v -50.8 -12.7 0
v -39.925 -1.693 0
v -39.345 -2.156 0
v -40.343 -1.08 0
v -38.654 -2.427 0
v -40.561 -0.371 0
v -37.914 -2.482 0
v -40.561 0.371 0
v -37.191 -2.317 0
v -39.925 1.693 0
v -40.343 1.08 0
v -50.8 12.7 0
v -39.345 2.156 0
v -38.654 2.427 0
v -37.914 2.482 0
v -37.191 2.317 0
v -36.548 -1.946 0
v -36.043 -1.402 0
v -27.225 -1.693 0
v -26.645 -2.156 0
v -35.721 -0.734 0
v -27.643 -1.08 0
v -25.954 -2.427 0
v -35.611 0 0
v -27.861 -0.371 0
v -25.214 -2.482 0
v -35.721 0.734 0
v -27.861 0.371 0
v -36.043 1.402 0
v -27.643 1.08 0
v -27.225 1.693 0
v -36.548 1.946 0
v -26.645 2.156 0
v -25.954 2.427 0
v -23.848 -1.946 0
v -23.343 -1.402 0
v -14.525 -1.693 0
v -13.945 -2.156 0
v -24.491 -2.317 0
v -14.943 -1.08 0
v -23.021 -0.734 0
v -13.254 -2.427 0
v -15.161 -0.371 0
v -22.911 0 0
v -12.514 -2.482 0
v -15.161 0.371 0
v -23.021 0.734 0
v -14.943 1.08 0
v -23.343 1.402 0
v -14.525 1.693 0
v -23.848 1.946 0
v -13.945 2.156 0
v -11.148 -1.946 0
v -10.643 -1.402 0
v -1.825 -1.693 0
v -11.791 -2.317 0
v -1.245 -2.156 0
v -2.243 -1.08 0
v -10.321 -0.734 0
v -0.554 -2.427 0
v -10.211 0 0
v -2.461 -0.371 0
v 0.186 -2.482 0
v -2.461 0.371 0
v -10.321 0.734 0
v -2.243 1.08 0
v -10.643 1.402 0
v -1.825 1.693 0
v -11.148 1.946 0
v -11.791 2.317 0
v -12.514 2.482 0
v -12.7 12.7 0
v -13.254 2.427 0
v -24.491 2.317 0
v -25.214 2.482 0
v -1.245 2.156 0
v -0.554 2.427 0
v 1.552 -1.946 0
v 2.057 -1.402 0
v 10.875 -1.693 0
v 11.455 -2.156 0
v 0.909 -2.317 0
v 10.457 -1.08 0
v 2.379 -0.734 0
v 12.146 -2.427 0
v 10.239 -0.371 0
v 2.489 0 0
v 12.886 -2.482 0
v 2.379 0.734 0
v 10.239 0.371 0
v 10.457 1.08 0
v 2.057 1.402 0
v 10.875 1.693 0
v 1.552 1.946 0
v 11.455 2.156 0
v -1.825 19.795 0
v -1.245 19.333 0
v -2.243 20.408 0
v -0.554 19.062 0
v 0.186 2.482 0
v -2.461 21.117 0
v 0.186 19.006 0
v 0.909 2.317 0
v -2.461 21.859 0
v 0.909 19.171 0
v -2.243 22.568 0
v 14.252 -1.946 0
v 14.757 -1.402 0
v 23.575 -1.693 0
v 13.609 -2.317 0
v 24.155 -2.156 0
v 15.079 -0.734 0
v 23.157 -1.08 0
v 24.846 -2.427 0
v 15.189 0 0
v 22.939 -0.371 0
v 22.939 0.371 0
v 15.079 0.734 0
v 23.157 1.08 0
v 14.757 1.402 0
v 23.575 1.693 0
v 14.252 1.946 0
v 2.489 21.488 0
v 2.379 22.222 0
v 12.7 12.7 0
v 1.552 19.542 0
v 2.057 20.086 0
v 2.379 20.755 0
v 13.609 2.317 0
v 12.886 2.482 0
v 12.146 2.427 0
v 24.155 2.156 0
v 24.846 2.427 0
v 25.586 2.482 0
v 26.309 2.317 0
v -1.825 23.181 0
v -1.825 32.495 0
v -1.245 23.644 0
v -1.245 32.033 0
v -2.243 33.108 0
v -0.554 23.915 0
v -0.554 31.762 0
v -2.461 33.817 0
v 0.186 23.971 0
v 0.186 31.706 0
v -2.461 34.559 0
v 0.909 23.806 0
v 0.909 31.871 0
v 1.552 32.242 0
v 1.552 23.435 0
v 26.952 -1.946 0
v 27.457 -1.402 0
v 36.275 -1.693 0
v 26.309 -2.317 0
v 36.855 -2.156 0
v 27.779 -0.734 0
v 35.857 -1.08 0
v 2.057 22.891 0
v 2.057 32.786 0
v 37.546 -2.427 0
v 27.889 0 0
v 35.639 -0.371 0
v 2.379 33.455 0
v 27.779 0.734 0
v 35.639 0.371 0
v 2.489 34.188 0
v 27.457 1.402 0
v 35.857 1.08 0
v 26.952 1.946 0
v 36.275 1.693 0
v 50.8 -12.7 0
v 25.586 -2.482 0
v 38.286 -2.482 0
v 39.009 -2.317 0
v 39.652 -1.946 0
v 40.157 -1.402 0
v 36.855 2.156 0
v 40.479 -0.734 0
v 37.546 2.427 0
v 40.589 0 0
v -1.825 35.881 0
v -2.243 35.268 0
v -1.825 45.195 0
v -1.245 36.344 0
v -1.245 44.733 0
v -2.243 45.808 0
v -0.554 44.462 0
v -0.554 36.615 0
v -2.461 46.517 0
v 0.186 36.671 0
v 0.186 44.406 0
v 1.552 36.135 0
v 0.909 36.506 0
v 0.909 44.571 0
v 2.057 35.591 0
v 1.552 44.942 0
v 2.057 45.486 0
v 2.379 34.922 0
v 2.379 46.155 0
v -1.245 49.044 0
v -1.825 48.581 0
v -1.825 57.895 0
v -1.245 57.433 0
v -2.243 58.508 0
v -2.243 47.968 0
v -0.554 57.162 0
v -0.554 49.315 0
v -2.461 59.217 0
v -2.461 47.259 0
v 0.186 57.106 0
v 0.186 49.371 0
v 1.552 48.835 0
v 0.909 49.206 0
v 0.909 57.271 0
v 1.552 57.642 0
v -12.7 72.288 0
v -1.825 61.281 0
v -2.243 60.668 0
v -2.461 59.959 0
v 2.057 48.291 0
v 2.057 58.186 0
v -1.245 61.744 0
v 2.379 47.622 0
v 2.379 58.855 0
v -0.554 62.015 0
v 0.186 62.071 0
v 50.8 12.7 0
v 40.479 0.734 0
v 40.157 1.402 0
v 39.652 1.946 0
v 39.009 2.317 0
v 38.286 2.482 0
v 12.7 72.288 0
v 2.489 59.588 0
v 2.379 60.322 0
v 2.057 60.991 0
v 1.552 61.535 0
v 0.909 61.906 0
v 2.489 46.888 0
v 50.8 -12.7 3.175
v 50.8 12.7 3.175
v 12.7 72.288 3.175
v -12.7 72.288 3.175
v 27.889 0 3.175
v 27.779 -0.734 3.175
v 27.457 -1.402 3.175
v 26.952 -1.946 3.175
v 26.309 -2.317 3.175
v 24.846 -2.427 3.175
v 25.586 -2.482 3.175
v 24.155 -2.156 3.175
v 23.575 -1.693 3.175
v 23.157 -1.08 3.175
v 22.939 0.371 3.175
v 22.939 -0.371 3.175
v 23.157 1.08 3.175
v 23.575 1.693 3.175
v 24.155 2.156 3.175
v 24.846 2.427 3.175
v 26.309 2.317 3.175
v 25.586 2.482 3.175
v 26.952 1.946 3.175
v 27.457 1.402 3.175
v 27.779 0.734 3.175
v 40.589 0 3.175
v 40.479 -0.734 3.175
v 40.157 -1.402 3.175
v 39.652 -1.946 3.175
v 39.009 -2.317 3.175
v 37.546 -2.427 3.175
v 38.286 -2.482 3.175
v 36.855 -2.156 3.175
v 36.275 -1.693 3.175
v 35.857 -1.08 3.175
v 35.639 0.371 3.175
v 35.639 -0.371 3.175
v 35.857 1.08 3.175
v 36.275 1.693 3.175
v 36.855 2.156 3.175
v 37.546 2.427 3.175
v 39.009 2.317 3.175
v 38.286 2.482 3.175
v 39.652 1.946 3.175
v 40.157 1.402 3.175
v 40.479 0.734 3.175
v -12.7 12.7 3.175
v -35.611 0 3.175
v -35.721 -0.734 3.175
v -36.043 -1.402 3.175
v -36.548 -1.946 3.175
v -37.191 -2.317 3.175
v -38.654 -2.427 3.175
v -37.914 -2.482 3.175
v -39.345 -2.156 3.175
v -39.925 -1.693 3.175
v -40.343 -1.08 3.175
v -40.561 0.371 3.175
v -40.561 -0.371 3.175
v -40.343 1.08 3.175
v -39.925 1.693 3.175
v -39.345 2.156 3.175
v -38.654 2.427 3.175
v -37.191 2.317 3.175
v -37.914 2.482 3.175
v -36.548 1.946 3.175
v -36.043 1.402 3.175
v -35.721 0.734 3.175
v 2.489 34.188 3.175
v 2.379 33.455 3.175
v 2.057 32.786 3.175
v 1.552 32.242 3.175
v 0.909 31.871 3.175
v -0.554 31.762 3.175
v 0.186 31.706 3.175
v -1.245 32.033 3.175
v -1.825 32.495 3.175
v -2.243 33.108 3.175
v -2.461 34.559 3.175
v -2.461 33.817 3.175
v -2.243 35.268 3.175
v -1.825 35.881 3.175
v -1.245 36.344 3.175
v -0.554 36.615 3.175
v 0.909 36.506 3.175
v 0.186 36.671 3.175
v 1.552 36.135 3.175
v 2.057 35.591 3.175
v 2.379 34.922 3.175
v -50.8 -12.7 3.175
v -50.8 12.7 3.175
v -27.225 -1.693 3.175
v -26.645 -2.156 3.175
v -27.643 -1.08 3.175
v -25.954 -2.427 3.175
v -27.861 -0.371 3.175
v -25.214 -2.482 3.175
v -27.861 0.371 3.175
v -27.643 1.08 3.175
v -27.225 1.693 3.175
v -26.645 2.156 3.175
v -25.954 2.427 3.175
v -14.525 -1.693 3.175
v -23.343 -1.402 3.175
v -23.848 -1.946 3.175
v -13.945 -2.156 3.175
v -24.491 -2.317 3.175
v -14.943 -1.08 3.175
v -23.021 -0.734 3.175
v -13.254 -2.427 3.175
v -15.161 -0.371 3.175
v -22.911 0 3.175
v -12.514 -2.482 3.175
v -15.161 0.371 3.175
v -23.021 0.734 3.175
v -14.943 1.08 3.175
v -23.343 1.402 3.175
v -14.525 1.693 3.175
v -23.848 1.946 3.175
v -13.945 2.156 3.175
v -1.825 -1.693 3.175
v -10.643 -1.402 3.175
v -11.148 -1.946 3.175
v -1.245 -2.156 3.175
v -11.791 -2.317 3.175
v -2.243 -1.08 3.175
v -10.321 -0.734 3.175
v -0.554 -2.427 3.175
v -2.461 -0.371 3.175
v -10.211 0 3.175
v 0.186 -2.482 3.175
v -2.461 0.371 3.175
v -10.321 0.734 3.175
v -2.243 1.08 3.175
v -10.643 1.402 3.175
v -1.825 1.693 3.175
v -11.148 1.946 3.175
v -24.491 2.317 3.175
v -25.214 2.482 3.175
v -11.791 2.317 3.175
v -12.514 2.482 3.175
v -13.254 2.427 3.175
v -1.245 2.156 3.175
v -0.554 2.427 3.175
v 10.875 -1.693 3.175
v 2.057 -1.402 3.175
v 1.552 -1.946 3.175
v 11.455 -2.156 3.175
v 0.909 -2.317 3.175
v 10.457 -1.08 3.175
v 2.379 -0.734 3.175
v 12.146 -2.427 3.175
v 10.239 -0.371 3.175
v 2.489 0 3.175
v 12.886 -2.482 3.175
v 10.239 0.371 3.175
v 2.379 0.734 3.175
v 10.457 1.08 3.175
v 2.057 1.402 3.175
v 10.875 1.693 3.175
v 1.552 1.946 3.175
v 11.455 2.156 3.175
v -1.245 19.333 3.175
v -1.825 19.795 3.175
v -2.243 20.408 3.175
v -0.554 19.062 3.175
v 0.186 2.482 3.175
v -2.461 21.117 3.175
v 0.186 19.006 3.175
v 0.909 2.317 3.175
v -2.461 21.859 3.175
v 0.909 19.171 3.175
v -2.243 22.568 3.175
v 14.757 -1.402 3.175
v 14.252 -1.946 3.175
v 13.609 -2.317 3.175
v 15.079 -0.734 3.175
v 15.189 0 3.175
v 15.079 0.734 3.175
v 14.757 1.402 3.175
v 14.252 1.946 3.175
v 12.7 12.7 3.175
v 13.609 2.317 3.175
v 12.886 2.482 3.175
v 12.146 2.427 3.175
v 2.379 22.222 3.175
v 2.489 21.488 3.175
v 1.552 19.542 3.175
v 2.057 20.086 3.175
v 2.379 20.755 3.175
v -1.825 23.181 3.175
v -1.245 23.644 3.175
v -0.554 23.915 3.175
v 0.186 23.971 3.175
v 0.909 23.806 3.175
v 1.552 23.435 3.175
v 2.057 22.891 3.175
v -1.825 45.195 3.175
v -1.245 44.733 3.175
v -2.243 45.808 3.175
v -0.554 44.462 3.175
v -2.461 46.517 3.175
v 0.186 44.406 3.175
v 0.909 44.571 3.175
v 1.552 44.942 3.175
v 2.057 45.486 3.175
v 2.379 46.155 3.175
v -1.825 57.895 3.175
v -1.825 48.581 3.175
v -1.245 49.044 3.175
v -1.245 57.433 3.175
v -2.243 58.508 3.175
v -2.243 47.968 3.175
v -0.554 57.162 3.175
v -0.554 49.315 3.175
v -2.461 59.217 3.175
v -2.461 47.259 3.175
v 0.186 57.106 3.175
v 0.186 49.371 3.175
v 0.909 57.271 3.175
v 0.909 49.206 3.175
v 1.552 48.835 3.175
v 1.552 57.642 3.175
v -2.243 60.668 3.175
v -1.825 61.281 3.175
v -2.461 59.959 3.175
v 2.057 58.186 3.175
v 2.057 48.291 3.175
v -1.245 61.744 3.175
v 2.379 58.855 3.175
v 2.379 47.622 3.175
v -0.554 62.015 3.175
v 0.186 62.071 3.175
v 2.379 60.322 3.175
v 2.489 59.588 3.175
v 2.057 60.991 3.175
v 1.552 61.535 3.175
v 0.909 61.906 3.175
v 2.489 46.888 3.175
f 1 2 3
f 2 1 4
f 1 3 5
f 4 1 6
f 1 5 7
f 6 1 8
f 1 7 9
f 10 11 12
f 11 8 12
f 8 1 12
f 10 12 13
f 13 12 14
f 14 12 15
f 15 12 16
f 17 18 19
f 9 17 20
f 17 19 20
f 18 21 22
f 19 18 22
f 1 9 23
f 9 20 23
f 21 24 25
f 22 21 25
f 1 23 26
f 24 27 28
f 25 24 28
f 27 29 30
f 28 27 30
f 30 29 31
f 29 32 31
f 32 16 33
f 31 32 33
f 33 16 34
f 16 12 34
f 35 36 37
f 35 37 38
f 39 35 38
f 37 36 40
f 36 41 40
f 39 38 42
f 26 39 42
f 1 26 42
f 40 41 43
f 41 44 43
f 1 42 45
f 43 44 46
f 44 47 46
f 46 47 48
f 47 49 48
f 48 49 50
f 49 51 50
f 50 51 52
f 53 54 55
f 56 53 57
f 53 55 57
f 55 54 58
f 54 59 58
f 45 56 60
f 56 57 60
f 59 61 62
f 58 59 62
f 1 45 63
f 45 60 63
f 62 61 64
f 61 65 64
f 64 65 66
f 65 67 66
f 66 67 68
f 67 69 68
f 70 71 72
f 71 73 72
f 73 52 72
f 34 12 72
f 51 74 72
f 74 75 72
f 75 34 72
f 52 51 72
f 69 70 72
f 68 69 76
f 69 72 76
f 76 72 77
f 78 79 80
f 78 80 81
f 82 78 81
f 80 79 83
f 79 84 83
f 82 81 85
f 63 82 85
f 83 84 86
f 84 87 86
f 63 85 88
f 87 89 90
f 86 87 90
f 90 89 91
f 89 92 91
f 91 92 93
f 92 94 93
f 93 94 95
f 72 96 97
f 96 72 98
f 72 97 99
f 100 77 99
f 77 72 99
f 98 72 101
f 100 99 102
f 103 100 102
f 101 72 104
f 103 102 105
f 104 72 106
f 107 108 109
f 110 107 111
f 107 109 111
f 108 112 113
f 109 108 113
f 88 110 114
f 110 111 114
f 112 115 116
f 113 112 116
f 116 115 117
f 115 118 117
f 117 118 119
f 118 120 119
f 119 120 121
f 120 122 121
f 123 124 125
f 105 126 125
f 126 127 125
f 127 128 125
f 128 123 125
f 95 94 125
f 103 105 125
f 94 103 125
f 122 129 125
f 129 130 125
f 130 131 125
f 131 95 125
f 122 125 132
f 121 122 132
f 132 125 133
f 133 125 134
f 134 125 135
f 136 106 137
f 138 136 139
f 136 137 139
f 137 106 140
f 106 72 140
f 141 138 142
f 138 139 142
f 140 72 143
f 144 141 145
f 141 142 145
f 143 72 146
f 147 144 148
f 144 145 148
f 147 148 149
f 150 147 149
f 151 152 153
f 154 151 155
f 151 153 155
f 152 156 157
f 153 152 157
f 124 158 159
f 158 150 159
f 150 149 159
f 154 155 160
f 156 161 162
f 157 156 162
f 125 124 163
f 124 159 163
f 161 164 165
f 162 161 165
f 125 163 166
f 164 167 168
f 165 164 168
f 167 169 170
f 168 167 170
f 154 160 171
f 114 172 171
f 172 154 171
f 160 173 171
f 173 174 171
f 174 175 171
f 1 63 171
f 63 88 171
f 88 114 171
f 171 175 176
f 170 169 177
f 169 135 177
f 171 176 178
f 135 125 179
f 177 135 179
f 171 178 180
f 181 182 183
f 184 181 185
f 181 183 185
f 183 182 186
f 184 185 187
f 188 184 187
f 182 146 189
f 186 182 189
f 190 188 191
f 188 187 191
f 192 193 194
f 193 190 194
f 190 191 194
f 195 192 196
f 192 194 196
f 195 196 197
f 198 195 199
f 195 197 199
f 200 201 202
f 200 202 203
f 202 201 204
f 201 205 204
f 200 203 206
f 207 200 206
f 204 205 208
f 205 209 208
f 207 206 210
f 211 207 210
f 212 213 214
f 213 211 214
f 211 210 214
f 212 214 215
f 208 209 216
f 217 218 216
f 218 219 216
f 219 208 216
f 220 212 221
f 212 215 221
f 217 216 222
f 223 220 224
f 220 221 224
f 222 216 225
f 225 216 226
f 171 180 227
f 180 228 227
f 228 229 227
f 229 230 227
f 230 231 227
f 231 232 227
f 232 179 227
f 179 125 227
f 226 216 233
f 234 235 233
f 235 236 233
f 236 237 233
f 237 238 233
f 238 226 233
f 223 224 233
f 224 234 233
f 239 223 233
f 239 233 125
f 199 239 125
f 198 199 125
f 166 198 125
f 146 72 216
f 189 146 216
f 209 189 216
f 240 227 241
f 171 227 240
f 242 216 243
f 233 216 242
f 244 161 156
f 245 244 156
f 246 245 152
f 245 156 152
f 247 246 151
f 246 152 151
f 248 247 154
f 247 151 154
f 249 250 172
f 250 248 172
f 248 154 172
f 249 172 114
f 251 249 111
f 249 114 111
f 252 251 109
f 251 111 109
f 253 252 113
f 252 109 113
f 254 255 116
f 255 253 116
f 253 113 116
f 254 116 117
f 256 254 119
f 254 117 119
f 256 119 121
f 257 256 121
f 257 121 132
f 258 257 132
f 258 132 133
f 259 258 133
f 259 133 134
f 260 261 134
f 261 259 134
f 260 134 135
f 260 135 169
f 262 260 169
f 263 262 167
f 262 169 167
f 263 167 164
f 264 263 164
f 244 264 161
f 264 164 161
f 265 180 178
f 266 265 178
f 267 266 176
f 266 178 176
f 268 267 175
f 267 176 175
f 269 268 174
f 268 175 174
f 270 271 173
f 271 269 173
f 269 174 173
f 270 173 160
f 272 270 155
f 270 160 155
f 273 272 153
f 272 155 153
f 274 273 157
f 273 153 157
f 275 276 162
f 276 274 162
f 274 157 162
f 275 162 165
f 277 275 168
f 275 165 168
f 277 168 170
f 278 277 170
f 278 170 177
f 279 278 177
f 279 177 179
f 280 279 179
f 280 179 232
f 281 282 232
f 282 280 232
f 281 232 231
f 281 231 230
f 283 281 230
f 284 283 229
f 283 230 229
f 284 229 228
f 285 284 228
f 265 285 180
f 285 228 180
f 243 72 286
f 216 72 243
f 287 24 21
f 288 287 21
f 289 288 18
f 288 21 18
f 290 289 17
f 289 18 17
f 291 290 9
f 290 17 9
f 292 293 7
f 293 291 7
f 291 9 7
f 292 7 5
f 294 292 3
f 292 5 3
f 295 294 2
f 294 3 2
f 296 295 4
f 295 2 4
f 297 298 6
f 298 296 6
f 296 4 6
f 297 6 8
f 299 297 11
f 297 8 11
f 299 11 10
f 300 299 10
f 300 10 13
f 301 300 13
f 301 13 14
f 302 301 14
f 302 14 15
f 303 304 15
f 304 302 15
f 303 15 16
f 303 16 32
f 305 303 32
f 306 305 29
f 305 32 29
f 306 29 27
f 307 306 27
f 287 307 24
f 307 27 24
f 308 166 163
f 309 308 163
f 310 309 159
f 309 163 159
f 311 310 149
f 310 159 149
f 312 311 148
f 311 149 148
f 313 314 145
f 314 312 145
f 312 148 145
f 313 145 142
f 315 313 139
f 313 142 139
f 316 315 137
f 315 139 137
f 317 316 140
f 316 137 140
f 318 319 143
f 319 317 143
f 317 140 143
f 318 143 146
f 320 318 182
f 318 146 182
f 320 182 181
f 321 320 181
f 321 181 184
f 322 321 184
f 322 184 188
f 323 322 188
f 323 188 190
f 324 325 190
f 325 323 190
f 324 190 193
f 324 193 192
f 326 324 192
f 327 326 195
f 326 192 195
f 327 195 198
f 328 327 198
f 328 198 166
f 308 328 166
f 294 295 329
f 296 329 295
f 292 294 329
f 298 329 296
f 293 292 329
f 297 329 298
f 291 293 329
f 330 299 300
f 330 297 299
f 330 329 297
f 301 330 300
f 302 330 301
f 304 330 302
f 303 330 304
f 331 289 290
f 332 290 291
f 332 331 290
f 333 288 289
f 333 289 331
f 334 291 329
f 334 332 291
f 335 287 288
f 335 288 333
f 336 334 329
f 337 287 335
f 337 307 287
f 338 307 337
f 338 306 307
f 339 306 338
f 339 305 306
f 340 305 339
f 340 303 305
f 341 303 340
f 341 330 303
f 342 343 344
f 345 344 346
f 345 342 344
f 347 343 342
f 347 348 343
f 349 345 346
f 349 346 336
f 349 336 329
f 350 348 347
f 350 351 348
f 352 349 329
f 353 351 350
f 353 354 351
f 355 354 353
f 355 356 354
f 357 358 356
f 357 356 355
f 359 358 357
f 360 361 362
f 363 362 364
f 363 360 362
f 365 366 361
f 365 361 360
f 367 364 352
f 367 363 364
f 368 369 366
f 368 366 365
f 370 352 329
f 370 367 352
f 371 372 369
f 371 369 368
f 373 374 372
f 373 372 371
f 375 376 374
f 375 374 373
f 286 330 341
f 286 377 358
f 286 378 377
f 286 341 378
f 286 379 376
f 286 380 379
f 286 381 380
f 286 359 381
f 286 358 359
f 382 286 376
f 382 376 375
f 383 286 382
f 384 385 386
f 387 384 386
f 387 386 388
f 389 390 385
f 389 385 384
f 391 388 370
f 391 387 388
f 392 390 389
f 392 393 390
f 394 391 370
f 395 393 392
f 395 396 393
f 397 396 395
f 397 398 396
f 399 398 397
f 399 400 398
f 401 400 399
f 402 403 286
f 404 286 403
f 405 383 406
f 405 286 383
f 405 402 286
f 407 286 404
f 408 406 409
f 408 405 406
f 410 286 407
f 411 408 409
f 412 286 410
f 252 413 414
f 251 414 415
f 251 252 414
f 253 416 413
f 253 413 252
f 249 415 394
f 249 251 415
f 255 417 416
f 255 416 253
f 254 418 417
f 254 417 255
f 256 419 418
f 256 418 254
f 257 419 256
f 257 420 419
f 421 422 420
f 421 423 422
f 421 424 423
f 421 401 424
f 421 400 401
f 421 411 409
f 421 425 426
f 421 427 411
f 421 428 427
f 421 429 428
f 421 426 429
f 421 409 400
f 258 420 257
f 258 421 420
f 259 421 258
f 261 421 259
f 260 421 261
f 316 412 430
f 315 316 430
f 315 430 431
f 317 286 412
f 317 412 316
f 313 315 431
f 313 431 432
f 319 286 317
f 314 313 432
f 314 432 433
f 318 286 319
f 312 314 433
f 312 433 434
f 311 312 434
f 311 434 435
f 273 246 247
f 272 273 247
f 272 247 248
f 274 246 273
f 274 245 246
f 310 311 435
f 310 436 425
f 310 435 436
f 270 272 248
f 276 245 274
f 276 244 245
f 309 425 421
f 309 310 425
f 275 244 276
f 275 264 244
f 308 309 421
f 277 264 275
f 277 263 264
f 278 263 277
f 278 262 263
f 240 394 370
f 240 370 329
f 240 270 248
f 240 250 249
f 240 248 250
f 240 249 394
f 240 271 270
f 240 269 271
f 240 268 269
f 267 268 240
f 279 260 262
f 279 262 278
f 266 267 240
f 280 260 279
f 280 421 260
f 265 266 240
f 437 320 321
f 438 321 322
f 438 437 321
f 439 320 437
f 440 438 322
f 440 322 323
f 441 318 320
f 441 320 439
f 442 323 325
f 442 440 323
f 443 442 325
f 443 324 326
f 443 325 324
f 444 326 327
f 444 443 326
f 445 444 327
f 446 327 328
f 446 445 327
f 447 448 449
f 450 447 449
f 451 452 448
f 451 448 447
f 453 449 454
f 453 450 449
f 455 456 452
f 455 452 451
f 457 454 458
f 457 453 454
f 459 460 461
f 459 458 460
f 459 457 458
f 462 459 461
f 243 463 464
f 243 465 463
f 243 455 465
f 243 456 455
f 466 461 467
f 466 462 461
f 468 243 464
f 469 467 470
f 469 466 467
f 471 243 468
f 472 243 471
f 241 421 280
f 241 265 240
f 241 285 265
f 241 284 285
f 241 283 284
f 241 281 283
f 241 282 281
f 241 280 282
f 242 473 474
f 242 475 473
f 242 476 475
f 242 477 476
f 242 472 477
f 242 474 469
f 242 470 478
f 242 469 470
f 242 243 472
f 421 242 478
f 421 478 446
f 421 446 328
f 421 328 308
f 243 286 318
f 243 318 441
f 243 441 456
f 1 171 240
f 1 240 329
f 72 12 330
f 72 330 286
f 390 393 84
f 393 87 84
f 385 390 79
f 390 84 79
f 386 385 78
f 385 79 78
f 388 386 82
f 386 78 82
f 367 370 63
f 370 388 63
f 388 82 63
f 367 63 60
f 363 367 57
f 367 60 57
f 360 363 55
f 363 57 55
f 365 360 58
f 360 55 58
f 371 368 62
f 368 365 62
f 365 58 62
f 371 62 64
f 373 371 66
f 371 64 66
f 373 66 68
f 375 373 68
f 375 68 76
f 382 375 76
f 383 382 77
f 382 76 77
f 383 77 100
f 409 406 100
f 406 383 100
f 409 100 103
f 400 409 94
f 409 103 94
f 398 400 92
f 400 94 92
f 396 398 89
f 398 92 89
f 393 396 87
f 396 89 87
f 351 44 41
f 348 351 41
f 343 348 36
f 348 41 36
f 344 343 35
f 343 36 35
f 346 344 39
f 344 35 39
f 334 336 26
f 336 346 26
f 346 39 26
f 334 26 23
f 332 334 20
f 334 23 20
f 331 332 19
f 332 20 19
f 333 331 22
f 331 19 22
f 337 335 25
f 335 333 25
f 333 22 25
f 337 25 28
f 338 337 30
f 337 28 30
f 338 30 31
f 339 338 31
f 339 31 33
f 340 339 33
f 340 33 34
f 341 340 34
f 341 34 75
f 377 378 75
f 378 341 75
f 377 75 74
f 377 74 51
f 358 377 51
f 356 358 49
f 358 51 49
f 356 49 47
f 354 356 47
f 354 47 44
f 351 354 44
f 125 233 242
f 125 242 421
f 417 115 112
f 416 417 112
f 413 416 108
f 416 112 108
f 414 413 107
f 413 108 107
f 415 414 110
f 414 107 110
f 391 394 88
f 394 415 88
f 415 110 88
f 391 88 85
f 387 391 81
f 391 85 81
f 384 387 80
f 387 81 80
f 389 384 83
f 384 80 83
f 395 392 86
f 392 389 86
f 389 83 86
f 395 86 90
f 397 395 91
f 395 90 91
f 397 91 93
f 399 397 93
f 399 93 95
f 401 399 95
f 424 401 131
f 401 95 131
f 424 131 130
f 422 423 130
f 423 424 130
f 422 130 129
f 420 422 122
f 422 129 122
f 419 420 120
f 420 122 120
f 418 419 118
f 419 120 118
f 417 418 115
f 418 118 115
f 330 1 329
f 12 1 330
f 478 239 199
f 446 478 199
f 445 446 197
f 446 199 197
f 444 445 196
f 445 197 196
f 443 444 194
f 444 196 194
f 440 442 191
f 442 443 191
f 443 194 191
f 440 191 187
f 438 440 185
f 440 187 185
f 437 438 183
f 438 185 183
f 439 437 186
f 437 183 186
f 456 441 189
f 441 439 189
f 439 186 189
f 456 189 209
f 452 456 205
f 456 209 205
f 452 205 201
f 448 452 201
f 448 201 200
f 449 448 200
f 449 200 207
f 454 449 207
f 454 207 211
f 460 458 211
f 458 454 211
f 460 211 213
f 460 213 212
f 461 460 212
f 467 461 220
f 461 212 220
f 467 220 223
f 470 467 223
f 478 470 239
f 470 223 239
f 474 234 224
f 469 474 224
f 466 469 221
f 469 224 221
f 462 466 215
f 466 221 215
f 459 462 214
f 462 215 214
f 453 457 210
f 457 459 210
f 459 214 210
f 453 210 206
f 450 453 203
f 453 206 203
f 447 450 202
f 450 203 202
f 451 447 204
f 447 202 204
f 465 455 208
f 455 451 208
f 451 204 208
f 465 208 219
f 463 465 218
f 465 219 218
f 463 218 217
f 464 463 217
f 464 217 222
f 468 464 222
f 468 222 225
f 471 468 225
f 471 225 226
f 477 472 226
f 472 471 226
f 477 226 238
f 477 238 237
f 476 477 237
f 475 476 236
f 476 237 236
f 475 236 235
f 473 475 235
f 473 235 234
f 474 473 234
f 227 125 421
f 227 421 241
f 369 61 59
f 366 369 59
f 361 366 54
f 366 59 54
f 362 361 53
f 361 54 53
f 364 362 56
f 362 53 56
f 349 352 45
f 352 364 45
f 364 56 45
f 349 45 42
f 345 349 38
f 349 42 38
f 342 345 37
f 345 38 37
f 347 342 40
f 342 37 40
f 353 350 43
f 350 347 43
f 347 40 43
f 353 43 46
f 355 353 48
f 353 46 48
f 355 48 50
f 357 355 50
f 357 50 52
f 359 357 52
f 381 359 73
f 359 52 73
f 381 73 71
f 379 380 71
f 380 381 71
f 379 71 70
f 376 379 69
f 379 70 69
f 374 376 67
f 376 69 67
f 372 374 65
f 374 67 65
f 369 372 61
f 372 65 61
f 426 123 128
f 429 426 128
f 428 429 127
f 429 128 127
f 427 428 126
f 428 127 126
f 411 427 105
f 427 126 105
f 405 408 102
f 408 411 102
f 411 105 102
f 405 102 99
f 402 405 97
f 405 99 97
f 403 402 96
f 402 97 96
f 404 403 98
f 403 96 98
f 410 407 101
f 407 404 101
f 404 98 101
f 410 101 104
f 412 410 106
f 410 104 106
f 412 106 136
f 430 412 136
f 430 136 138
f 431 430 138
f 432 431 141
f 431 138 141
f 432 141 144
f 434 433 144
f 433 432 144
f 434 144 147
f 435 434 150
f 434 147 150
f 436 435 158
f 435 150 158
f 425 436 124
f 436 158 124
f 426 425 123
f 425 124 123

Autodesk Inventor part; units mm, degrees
ref_plane "YZ Plane" through (0, 0, 0) normal (1, 0, 0) x (0, 1, 0)
ref_plane "XZ Plane" through (0, 0, 0) normal (0, 1, 0) x (-1, 0, 0)
ref_plane "XY Plane" through (0, 0, 0) normal (0, 0, 1) x (1, 0, 0)
sketch "Sketch1" plane through (0, 0, 0) normal (0, 0, 1) x (1, 0, 0)
  circle A0 centre (0, 0) radius 2.4892
  circle A1 centre (0, 21.4884) radius 2.4892
  line L0 (-15.227, -8.5114) -> (-2.527, -8.5114) construction
  line L1 (-8.877, -8.5114) -> (-8.877, -14.8614) construction
  circle A2 centre (12.7, 0) radius 2.4892
  circle A3 centre (25.4, 0) radius 2.4892
  circle A4 centre (38.1, 0) radius 2.4892
  circle A5 centre (-12.7, 0) radius 2.4892
  circle A6 centre (-25.4, 0) radius 2.4892
  circle A7 centre (-38.1, 0) radius 2.4892
  circle A8 centre (0, 34.1884) radius 2.4892
  circle A9 centre (0, 46.8884) radius 2.4892
  circle A10 centre (0, 59.5884) radius 2.4892
  line L2 (50.8, 12.7) -> (50.8, -12.7)
  line L3 (50.8, -12.7) -> (-50.8, -12.7)
  line L4 (-50.8, -12.7) -> (-50.8, 12.7)
  line L5 (-12.7, 72.2884) -> (12.7, 72.2884)
  line L6 (12.7, 72.2884) -> (12.7, 12.7)
  line L7 (-8.877, 12.7) -> (-12.7, 12.7)
  line L8 (-12.7, 12.7) -> (-12.7, 72.2884)
  line L9 (-50.8, 12.7) -> (-12.7, 12.7)
  line L10 (12.7, 12.7) -> (50.8, 12.7)
  dimension "d0" = 4.9784
  dimension "d1" = 4.9784
  dimension "d2" = 21.4884
  dimension "d3" = 12.7
  dimension "d4" = 6.35
  dimension "d7" = 12.7
  dimension "d14" = 12.7
  dimension "d21" = 12.7
  dimension "d33" = 25.4
extrude "Extrusion1" add sketch "Sketch1" along normal blind 3.175
properties part number "Custom-Underside-T-Gusset" material "Aluminum 6061"
